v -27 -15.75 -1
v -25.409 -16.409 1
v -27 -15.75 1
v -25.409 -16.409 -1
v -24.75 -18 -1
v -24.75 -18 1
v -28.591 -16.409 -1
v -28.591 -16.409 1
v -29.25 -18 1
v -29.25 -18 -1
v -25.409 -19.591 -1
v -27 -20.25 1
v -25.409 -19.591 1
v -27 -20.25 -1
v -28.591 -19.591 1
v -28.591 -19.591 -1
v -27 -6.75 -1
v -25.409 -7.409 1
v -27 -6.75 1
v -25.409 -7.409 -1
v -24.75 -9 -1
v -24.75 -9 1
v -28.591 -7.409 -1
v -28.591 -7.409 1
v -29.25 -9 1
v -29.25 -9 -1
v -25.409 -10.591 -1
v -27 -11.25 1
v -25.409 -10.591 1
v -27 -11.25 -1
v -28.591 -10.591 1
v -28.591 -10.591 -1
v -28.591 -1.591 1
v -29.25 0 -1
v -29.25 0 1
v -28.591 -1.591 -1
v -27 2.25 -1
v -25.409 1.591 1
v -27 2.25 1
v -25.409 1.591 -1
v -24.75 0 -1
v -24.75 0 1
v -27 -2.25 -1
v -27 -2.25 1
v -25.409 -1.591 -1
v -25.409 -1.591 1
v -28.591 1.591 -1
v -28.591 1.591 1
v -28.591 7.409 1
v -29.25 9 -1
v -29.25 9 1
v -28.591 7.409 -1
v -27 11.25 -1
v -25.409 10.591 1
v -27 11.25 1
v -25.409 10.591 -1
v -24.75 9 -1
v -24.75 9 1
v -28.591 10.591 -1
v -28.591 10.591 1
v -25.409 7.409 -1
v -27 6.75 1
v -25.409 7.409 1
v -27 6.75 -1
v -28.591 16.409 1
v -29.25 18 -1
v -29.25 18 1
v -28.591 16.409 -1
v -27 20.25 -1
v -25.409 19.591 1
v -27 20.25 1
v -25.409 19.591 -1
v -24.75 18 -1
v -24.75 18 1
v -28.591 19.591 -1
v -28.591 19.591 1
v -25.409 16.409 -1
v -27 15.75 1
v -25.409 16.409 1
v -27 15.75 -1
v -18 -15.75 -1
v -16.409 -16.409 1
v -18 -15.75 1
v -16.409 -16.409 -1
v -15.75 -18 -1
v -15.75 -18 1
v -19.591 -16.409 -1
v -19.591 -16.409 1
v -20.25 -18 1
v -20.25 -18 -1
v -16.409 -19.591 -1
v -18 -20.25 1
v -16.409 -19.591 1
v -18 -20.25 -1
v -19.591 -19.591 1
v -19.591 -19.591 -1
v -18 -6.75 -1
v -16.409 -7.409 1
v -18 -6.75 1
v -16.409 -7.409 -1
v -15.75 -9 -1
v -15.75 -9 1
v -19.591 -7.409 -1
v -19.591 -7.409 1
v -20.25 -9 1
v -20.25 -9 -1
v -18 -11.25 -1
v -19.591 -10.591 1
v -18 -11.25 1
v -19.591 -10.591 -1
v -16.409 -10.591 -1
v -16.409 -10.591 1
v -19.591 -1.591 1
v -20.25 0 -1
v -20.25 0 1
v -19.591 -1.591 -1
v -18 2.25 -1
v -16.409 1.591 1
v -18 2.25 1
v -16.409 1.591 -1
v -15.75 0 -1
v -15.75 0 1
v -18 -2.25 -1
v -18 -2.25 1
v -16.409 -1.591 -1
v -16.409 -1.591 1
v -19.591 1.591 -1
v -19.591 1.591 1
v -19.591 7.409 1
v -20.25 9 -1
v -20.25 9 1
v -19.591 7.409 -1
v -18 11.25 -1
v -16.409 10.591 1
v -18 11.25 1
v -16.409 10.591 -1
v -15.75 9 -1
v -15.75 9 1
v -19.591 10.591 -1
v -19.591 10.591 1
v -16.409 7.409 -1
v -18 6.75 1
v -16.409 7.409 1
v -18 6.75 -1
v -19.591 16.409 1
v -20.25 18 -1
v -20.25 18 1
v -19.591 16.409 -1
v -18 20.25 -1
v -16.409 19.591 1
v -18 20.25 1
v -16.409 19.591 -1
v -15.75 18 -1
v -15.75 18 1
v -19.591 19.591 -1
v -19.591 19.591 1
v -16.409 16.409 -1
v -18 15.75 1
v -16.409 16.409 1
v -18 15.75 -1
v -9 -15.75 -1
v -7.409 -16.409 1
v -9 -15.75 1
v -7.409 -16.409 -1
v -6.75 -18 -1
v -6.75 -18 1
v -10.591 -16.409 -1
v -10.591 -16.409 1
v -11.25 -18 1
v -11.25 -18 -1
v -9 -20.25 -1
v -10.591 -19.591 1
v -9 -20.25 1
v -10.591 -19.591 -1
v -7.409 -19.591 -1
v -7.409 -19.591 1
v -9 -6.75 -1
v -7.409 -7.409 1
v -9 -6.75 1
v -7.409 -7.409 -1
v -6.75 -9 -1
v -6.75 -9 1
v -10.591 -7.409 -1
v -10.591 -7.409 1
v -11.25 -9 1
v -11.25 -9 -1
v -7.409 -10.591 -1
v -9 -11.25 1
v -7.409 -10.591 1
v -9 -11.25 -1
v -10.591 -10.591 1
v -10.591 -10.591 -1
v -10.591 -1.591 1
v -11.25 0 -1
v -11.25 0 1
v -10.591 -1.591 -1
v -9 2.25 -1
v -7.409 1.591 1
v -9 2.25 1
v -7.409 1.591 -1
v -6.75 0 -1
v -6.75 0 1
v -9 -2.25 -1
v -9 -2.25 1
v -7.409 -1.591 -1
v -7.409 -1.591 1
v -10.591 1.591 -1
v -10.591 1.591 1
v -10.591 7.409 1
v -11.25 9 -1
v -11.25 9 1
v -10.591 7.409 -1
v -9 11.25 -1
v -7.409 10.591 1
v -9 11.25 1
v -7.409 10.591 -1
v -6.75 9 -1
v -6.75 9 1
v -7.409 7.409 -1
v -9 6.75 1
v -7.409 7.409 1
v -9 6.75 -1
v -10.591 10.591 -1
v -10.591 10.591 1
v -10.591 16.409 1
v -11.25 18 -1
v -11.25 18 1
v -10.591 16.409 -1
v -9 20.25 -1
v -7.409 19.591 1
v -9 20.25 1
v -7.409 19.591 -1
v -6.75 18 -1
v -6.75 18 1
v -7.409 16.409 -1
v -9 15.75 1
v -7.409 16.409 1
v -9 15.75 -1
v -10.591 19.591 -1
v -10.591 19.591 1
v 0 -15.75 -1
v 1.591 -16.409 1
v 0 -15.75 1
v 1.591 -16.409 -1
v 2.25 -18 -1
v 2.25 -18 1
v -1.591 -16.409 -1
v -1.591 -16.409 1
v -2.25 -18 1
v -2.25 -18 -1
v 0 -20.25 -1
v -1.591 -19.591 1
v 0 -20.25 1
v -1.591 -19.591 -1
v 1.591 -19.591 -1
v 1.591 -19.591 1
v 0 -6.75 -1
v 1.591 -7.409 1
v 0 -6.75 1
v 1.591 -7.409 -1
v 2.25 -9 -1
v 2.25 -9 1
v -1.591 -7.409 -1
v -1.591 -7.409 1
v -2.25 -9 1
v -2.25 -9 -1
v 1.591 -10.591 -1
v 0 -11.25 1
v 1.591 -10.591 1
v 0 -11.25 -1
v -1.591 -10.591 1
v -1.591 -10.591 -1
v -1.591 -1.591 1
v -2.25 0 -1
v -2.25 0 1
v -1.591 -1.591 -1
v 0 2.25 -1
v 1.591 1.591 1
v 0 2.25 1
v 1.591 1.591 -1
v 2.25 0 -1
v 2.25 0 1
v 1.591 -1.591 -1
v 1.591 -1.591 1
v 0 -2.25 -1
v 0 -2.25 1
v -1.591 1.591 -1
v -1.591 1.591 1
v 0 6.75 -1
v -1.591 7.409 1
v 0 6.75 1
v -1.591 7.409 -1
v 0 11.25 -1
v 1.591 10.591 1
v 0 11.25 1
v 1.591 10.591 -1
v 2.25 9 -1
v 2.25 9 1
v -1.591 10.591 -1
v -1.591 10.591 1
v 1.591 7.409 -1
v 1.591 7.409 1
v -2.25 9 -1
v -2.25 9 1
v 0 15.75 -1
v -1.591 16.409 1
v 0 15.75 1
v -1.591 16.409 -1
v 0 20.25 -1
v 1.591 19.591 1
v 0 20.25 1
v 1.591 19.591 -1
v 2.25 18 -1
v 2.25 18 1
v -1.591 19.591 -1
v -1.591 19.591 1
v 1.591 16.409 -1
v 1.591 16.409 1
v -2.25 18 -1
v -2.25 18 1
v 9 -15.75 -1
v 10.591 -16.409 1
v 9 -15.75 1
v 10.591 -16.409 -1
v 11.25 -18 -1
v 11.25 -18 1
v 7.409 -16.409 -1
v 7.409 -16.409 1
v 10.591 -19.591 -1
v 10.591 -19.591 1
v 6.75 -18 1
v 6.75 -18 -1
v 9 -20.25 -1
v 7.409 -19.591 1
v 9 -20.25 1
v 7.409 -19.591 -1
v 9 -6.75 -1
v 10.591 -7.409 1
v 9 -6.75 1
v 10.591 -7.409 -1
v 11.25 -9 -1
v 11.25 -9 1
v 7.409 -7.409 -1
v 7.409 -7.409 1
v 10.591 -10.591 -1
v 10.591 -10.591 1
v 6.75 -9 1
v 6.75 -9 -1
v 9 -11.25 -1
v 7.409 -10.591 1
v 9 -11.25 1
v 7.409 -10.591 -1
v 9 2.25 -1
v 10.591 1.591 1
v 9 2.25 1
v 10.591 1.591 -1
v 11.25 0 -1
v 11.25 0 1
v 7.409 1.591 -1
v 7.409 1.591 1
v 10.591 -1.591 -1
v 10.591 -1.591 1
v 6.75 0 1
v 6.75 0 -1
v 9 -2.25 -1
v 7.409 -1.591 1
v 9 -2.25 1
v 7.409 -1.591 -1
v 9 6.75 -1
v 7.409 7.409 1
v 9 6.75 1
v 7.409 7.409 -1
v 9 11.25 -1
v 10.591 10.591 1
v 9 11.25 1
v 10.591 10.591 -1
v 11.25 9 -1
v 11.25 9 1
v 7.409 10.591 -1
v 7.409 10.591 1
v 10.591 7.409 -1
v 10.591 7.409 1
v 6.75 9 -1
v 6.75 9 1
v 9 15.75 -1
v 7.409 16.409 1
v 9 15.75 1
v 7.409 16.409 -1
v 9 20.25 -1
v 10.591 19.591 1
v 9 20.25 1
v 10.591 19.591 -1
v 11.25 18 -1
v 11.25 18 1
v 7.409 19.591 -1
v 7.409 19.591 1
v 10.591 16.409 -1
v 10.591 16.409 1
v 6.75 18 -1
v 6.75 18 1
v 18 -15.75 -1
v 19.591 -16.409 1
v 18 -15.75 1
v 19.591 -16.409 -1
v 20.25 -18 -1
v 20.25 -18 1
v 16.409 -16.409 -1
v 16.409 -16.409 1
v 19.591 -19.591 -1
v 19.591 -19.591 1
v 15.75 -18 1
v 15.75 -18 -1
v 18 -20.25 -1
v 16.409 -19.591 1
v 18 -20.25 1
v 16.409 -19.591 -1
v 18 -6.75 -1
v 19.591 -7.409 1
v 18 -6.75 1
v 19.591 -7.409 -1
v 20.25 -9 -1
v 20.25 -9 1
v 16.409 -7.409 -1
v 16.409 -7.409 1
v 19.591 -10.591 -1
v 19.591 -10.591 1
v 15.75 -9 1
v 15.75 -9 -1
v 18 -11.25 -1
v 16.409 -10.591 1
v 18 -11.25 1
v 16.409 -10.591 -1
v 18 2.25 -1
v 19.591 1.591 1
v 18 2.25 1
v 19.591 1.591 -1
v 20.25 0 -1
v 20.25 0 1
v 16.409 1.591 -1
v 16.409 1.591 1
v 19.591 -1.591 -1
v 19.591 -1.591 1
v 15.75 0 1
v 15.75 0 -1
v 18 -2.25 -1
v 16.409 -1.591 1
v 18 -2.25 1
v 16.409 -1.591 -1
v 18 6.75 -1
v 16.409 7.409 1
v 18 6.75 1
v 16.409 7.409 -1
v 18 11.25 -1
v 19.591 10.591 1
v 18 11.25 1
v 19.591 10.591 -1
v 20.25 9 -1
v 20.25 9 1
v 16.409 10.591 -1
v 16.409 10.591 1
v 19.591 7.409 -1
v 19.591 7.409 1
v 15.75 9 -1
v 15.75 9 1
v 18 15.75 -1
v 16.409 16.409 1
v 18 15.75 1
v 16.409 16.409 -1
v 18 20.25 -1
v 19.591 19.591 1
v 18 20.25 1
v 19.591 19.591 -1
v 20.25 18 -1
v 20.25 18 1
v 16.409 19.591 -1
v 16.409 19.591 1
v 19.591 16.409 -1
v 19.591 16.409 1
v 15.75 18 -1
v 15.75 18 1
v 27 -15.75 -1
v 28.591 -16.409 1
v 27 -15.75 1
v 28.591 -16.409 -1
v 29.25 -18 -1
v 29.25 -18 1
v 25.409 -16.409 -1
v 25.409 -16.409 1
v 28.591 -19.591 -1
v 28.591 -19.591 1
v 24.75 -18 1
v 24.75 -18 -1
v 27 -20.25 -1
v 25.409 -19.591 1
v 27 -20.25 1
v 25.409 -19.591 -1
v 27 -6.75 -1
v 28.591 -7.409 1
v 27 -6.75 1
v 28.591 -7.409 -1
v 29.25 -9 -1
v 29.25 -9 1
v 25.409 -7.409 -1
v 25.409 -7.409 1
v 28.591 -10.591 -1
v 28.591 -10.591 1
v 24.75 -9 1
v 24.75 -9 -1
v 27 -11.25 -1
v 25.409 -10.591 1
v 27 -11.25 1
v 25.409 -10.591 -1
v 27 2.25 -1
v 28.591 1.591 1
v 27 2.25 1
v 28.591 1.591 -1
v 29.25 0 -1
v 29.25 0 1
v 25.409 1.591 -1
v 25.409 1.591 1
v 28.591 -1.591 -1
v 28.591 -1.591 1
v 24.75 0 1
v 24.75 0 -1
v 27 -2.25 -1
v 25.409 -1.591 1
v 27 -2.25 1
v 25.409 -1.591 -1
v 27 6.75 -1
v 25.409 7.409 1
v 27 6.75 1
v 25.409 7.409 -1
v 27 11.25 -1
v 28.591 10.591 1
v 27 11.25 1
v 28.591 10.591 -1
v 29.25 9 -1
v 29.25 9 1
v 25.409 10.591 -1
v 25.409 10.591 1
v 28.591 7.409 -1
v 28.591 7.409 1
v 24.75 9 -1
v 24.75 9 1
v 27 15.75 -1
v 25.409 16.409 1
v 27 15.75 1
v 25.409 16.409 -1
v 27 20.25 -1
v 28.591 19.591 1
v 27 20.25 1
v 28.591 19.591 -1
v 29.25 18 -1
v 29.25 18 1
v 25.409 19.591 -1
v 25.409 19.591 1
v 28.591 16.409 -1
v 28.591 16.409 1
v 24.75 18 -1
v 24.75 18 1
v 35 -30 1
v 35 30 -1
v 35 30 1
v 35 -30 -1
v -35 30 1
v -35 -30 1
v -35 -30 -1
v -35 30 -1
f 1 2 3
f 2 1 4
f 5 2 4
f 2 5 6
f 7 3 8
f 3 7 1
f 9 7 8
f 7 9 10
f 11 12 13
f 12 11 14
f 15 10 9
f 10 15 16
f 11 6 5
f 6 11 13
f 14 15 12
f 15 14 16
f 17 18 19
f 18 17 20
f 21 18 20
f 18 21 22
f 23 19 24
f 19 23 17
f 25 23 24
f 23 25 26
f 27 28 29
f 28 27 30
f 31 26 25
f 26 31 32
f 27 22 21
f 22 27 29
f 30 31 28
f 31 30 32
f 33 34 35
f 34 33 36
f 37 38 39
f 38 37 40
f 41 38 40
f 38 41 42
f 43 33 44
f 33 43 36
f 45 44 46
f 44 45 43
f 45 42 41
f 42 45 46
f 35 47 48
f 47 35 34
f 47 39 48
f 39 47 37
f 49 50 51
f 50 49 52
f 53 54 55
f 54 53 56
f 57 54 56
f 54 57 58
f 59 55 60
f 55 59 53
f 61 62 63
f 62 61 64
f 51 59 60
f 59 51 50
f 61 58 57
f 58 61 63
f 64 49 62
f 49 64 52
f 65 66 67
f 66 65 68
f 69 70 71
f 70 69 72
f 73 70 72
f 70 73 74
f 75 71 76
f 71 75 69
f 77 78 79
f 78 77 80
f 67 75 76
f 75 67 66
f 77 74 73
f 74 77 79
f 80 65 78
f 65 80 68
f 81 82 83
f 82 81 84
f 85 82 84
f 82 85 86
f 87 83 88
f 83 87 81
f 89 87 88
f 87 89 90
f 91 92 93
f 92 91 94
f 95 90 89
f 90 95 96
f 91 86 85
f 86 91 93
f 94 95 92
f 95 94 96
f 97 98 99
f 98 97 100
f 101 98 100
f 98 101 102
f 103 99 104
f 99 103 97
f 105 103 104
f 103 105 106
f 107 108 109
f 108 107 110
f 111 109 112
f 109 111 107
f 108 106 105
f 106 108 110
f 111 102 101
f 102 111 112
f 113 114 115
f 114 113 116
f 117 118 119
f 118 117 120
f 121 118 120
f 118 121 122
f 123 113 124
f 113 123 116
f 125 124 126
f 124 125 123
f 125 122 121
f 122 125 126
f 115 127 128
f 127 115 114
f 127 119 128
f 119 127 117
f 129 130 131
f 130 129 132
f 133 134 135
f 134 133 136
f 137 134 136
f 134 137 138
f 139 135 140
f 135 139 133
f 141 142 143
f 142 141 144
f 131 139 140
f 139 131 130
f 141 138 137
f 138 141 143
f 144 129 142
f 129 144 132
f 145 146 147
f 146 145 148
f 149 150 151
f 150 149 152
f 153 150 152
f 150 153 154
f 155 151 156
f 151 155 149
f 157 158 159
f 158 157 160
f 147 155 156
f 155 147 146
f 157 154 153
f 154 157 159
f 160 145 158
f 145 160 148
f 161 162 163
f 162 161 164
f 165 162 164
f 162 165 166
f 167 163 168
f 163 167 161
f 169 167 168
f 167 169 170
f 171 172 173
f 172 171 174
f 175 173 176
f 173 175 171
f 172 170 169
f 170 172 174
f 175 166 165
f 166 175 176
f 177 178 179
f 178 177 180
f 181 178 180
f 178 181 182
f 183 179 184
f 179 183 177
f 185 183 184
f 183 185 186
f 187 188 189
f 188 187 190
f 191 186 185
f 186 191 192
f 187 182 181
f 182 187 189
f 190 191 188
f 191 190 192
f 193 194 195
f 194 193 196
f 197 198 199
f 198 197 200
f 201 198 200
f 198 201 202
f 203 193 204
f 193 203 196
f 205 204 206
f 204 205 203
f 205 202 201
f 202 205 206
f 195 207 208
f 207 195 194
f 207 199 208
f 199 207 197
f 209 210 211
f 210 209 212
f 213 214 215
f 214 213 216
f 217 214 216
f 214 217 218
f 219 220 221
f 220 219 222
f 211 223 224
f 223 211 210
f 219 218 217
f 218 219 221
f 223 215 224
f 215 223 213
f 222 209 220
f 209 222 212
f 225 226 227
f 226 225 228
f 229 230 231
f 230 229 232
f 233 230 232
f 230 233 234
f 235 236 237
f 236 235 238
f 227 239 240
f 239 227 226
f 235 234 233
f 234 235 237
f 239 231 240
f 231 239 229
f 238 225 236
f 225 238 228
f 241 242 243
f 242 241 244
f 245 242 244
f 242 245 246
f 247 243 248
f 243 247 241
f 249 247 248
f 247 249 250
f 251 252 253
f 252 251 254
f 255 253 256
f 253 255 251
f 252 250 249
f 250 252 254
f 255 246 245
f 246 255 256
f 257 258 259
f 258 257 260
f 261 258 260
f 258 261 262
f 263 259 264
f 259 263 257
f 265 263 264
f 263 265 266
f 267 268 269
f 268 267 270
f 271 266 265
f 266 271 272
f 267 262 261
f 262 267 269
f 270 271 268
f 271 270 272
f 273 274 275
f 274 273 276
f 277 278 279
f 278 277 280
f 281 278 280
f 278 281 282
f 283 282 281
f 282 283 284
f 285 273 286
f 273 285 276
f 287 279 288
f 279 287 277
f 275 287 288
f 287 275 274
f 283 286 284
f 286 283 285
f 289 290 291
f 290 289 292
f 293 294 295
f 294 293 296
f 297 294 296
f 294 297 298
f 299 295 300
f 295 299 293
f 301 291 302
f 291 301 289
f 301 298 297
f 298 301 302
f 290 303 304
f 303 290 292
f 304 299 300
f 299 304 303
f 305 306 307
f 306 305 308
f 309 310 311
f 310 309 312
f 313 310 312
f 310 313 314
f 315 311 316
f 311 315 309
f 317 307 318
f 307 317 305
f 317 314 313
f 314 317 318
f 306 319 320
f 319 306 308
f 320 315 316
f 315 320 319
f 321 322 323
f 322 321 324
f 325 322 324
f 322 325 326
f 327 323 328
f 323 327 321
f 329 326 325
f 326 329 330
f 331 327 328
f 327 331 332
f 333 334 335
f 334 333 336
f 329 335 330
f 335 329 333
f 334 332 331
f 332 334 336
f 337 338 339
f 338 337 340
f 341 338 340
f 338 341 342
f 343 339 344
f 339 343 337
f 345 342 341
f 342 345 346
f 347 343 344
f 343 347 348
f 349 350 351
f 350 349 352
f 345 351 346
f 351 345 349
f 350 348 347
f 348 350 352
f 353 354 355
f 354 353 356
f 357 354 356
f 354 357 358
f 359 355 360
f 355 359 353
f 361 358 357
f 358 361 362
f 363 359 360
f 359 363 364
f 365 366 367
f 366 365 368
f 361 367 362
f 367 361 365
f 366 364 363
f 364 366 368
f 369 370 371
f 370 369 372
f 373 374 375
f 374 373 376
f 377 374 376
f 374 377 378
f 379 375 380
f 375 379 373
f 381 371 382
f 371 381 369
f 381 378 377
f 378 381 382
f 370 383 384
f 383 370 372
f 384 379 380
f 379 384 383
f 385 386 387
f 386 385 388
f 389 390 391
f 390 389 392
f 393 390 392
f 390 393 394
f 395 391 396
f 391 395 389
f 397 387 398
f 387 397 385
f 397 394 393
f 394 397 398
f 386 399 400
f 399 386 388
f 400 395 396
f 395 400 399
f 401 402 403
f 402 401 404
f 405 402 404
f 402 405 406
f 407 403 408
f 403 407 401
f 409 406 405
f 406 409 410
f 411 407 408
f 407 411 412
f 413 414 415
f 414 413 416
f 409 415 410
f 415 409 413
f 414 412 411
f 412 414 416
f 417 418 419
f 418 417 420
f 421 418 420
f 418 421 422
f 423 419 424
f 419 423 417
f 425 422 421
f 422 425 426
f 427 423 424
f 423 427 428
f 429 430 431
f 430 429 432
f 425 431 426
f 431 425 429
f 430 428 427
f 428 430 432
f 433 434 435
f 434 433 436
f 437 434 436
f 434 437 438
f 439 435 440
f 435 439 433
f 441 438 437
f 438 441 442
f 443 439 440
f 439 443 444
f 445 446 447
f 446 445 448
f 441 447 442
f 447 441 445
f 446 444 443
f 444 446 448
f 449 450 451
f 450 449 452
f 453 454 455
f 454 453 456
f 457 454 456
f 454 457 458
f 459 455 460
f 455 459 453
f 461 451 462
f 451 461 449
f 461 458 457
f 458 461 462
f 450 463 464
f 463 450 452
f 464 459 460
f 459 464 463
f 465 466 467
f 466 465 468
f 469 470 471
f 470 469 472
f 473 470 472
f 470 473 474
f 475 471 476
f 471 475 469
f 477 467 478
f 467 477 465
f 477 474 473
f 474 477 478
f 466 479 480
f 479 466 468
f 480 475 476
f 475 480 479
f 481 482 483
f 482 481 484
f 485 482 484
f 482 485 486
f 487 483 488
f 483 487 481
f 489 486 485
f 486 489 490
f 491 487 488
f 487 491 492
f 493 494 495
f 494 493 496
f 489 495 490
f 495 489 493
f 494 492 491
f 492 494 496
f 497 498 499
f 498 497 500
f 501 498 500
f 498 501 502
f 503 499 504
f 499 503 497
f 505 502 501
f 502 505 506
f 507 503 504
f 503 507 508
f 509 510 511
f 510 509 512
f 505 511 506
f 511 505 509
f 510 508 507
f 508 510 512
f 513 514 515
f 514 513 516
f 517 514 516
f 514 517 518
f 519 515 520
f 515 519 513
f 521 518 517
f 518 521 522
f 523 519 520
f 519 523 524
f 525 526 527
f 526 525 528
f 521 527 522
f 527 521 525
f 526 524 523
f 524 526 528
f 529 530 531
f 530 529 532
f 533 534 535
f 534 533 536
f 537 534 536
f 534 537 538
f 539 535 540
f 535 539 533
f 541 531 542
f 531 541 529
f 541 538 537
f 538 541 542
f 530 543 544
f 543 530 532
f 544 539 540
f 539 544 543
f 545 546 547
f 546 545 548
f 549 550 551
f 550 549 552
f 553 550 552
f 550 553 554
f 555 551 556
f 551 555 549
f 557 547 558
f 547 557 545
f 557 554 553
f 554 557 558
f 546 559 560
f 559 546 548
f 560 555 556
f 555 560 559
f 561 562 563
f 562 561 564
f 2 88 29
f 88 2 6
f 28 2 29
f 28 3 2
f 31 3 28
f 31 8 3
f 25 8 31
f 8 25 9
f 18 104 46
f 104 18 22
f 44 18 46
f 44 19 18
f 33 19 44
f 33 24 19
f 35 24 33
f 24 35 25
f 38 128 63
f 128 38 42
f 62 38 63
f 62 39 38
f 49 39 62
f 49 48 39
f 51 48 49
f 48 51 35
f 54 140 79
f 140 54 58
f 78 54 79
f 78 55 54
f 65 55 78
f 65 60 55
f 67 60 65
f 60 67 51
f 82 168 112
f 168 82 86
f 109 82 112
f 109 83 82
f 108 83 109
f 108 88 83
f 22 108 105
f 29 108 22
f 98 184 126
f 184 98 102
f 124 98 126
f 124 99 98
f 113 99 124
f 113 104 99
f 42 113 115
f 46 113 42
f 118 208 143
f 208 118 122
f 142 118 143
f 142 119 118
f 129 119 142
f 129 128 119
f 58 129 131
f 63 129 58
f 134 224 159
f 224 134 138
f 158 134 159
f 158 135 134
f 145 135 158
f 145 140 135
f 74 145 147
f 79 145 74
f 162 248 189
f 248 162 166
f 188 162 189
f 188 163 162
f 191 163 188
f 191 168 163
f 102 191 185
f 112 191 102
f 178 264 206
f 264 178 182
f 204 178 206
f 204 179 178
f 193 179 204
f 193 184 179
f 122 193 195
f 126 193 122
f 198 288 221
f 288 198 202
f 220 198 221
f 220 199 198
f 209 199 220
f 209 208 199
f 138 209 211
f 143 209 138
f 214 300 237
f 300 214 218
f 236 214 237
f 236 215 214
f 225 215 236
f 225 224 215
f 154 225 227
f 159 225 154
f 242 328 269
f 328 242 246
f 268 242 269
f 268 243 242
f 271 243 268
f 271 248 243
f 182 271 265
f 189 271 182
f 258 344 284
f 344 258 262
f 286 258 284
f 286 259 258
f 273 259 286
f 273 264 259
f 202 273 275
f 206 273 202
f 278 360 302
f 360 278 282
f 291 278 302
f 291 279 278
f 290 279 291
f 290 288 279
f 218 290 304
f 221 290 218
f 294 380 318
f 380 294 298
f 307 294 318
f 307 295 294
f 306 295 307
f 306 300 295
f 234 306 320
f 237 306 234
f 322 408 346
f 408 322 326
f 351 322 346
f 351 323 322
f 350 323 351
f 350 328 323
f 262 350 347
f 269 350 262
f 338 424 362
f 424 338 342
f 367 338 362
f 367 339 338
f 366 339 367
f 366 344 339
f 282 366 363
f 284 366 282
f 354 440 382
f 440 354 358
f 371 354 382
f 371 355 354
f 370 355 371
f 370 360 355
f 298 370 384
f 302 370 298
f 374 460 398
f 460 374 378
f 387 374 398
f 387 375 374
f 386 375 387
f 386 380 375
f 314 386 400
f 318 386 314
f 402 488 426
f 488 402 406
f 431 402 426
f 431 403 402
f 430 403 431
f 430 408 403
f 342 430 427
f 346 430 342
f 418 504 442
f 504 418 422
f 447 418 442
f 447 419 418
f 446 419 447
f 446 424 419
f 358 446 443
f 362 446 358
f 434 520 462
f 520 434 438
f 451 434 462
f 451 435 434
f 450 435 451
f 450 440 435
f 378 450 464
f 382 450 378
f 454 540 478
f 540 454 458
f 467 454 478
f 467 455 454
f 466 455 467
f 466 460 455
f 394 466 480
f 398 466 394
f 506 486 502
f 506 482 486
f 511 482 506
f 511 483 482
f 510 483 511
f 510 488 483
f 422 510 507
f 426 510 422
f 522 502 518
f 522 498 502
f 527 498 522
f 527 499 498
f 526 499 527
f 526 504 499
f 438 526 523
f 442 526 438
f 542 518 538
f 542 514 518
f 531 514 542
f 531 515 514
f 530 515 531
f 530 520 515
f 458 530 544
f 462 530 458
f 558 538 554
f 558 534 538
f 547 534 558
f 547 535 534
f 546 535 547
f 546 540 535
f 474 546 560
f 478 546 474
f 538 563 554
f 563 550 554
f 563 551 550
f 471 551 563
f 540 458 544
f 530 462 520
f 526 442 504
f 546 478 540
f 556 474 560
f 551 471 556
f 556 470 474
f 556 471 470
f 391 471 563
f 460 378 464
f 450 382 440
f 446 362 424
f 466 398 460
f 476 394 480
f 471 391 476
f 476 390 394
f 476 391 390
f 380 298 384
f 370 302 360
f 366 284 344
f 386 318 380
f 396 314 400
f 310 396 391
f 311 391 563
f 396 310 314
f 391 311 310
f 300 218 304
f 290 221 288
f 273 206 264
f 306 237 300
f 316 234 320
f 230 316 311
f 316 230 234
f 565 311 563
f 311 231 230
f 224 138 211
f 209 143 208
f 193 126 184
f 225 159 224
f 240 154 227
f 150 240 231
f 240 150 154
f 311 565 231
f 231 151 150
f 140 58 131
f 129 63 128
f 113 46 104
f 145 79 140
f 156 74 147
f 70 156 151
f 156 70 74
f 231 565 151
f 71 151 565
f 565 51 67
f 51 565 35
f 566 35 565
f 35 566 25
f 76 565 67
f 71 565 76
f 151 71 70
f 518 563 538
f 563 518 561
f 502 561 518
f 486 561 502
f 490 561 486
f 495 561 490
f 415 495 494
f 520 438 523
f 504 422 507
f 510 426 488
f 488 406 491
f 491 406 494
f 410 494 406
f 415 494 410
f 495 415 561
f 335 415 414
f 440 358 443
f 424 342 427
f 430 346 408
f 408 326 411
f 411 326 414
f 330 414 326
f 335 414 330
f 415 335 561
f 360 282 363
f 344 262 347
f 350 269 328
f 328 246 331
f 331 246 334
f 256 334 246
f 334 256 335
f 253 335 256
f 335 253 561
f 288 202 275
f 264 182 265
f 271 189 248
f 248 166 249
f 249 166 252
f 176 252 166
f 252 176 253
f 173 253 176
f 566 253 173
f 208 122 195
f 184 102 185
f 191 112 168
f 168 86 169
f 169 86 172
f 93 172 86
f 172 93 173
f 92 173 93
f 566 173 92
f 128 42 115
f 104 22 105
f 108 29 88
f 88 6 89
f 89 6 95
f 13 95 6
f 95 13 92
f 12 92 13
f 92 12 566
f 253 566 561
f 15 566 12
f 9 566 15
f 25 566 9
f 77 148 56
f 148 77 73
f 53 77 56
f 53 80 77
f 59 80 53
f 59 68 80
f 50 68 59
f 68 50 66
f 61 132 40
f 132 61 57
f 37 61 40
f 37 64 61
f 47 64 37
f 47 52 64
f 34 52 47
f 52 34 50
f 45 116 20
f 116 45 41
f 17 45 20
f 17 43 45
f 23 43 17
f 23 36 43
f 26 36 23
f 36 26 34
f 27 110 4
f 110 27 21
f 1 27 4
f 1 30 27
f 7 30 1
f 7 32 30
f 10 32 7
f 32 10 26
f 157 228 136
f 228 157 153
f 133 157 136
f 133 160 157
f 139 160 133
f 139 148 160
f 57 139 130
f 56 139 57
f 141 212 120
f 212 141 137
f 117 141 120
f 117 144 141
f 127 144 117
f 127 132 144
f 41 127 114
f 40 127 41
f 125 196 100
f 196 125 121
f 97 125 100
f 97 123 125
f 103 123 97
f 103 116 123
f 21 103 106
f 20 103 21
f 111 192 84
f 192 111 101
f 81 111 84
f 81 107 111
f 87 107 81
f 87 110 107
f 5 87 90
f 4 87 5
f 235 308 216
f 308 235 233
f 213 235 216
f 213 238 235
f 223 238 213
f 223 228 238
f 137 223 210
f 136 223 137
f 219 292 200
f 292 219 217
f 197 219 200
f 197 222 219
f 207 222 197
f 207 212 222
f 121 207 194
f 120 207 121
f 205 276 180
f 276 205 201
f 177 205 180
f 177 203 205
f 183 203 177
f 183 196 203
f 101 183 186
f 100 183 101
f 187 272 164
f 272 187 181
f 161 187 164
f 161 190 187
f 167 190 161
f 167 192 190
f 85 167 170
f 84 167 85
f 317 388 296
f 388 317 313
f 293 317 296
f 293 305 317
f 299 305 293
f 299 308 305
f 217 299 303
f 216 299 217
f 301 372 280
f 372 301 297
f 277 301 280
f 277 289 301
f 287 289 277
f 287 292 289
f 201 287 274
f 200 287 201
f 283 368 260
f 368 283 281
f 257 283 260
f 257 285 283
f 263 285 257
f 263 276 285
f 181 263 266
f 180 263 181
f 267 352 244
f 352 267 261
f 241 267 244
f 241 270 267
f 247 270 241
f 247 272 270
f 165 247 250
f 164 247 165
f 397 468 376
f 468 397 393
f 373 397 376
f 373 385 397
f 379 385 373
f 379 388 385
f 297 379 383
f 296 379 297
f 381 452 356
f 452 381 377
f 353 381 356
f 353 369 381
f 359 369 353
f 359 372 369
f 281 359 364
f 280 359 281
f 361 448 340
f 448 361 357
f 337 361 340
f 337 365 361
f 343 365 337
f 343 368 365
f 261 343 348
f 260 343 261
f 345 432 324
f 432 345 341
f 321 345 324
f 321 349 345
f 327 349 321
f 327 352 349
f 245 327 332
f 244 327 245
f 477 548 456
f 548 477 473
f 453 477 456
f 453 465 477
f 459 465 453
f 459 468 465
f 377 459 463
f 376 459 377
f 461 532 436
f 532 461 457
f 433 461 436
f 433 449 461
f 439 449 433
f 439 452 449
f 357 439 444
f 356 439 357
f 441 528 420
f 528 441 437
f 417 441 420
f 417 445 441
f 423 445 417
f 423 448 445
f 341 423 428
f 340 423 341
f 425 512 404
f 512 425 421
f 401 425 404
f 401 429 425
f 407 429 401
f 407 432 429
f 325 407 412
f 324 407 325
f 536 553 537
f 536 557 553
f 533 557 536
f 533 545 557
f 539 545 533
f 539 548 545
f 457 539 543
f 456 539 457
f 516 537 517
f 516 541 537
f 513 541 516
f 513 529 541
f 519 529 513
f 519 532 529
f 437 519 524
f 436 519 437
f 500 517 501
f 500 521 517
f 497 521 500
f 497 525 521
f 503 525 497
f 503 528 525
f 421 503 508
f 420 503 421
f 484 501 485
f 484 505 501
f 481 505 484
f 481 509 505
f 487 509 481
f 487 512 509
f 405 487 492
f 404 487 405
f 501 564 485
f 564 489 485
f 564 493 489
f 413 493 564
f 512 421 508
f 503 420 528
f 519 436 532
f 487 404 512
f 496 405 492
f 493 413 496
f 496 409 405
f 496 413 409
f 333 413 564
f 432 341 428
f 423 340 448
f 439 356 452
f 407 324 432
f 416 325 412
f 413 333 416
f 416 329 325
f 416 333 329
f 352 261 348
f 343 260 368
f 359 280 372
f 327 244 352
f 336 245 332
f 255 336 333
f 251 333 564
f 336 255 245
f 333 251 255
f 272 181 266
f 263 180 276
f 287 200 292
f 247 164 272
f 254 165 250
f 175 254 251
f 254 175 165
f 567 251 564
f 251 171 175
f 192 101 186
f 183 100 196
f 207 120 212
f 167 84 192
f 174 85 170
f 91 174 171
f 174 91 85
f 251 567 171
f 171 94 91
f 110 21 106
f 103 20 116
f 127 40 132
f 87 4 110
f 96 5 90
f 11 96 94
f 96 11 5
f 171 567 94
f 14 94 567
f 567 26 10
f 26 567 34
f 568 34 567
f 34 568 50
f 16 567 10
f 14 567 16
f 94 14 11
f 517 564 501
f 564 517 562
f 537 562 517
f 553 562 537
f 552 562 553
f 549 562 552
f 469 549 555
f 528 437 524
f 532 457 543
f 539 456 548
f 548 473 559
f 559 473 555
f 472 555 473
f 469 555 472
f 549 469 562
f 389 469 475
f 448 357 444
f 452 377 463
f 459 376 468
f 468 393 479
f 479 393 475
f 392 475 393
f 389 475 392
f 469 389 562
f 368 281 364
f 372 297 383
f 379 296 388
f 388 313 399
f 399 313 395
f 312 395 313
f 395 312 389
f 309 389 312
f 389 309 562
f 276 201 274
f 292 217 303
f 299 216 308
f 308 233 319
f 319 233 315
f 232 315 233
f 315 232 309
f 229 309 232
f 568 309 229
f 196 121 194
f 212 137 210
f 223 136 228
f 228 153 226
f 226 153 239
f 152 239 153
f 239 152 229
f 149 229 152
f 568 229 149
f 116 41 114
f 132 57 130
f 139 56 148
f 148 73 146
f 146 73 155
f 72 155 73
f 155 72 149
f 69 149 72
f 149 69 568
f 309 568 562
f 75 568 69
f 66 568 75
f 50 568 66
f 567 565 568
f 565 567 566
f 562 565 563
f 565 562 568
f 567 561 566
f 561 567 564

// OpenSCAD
mk5_d = 4.5;
mk5_h = 31;

mk200_d = 6.5;
mk200_h = 50;

big_tubes_d = 11.5;
big_tubes_h = 75;

// centrifuge tubes

module holes(d, h=50) {
  for(x=[-3:3]) {
    for(y=[-2:2]) {
      translate([x*d*2, y*d*2, 0]) {
        cylinder(d=d, h=h, center=true);
      }
    }
  }
}

//union() {
difference() {
  cube([70, 60, 2], center=true);
  holes(d=mk5_d);
}

//translate([100, 0, 0]) {
//  holes(d=mk200_d);
//}
